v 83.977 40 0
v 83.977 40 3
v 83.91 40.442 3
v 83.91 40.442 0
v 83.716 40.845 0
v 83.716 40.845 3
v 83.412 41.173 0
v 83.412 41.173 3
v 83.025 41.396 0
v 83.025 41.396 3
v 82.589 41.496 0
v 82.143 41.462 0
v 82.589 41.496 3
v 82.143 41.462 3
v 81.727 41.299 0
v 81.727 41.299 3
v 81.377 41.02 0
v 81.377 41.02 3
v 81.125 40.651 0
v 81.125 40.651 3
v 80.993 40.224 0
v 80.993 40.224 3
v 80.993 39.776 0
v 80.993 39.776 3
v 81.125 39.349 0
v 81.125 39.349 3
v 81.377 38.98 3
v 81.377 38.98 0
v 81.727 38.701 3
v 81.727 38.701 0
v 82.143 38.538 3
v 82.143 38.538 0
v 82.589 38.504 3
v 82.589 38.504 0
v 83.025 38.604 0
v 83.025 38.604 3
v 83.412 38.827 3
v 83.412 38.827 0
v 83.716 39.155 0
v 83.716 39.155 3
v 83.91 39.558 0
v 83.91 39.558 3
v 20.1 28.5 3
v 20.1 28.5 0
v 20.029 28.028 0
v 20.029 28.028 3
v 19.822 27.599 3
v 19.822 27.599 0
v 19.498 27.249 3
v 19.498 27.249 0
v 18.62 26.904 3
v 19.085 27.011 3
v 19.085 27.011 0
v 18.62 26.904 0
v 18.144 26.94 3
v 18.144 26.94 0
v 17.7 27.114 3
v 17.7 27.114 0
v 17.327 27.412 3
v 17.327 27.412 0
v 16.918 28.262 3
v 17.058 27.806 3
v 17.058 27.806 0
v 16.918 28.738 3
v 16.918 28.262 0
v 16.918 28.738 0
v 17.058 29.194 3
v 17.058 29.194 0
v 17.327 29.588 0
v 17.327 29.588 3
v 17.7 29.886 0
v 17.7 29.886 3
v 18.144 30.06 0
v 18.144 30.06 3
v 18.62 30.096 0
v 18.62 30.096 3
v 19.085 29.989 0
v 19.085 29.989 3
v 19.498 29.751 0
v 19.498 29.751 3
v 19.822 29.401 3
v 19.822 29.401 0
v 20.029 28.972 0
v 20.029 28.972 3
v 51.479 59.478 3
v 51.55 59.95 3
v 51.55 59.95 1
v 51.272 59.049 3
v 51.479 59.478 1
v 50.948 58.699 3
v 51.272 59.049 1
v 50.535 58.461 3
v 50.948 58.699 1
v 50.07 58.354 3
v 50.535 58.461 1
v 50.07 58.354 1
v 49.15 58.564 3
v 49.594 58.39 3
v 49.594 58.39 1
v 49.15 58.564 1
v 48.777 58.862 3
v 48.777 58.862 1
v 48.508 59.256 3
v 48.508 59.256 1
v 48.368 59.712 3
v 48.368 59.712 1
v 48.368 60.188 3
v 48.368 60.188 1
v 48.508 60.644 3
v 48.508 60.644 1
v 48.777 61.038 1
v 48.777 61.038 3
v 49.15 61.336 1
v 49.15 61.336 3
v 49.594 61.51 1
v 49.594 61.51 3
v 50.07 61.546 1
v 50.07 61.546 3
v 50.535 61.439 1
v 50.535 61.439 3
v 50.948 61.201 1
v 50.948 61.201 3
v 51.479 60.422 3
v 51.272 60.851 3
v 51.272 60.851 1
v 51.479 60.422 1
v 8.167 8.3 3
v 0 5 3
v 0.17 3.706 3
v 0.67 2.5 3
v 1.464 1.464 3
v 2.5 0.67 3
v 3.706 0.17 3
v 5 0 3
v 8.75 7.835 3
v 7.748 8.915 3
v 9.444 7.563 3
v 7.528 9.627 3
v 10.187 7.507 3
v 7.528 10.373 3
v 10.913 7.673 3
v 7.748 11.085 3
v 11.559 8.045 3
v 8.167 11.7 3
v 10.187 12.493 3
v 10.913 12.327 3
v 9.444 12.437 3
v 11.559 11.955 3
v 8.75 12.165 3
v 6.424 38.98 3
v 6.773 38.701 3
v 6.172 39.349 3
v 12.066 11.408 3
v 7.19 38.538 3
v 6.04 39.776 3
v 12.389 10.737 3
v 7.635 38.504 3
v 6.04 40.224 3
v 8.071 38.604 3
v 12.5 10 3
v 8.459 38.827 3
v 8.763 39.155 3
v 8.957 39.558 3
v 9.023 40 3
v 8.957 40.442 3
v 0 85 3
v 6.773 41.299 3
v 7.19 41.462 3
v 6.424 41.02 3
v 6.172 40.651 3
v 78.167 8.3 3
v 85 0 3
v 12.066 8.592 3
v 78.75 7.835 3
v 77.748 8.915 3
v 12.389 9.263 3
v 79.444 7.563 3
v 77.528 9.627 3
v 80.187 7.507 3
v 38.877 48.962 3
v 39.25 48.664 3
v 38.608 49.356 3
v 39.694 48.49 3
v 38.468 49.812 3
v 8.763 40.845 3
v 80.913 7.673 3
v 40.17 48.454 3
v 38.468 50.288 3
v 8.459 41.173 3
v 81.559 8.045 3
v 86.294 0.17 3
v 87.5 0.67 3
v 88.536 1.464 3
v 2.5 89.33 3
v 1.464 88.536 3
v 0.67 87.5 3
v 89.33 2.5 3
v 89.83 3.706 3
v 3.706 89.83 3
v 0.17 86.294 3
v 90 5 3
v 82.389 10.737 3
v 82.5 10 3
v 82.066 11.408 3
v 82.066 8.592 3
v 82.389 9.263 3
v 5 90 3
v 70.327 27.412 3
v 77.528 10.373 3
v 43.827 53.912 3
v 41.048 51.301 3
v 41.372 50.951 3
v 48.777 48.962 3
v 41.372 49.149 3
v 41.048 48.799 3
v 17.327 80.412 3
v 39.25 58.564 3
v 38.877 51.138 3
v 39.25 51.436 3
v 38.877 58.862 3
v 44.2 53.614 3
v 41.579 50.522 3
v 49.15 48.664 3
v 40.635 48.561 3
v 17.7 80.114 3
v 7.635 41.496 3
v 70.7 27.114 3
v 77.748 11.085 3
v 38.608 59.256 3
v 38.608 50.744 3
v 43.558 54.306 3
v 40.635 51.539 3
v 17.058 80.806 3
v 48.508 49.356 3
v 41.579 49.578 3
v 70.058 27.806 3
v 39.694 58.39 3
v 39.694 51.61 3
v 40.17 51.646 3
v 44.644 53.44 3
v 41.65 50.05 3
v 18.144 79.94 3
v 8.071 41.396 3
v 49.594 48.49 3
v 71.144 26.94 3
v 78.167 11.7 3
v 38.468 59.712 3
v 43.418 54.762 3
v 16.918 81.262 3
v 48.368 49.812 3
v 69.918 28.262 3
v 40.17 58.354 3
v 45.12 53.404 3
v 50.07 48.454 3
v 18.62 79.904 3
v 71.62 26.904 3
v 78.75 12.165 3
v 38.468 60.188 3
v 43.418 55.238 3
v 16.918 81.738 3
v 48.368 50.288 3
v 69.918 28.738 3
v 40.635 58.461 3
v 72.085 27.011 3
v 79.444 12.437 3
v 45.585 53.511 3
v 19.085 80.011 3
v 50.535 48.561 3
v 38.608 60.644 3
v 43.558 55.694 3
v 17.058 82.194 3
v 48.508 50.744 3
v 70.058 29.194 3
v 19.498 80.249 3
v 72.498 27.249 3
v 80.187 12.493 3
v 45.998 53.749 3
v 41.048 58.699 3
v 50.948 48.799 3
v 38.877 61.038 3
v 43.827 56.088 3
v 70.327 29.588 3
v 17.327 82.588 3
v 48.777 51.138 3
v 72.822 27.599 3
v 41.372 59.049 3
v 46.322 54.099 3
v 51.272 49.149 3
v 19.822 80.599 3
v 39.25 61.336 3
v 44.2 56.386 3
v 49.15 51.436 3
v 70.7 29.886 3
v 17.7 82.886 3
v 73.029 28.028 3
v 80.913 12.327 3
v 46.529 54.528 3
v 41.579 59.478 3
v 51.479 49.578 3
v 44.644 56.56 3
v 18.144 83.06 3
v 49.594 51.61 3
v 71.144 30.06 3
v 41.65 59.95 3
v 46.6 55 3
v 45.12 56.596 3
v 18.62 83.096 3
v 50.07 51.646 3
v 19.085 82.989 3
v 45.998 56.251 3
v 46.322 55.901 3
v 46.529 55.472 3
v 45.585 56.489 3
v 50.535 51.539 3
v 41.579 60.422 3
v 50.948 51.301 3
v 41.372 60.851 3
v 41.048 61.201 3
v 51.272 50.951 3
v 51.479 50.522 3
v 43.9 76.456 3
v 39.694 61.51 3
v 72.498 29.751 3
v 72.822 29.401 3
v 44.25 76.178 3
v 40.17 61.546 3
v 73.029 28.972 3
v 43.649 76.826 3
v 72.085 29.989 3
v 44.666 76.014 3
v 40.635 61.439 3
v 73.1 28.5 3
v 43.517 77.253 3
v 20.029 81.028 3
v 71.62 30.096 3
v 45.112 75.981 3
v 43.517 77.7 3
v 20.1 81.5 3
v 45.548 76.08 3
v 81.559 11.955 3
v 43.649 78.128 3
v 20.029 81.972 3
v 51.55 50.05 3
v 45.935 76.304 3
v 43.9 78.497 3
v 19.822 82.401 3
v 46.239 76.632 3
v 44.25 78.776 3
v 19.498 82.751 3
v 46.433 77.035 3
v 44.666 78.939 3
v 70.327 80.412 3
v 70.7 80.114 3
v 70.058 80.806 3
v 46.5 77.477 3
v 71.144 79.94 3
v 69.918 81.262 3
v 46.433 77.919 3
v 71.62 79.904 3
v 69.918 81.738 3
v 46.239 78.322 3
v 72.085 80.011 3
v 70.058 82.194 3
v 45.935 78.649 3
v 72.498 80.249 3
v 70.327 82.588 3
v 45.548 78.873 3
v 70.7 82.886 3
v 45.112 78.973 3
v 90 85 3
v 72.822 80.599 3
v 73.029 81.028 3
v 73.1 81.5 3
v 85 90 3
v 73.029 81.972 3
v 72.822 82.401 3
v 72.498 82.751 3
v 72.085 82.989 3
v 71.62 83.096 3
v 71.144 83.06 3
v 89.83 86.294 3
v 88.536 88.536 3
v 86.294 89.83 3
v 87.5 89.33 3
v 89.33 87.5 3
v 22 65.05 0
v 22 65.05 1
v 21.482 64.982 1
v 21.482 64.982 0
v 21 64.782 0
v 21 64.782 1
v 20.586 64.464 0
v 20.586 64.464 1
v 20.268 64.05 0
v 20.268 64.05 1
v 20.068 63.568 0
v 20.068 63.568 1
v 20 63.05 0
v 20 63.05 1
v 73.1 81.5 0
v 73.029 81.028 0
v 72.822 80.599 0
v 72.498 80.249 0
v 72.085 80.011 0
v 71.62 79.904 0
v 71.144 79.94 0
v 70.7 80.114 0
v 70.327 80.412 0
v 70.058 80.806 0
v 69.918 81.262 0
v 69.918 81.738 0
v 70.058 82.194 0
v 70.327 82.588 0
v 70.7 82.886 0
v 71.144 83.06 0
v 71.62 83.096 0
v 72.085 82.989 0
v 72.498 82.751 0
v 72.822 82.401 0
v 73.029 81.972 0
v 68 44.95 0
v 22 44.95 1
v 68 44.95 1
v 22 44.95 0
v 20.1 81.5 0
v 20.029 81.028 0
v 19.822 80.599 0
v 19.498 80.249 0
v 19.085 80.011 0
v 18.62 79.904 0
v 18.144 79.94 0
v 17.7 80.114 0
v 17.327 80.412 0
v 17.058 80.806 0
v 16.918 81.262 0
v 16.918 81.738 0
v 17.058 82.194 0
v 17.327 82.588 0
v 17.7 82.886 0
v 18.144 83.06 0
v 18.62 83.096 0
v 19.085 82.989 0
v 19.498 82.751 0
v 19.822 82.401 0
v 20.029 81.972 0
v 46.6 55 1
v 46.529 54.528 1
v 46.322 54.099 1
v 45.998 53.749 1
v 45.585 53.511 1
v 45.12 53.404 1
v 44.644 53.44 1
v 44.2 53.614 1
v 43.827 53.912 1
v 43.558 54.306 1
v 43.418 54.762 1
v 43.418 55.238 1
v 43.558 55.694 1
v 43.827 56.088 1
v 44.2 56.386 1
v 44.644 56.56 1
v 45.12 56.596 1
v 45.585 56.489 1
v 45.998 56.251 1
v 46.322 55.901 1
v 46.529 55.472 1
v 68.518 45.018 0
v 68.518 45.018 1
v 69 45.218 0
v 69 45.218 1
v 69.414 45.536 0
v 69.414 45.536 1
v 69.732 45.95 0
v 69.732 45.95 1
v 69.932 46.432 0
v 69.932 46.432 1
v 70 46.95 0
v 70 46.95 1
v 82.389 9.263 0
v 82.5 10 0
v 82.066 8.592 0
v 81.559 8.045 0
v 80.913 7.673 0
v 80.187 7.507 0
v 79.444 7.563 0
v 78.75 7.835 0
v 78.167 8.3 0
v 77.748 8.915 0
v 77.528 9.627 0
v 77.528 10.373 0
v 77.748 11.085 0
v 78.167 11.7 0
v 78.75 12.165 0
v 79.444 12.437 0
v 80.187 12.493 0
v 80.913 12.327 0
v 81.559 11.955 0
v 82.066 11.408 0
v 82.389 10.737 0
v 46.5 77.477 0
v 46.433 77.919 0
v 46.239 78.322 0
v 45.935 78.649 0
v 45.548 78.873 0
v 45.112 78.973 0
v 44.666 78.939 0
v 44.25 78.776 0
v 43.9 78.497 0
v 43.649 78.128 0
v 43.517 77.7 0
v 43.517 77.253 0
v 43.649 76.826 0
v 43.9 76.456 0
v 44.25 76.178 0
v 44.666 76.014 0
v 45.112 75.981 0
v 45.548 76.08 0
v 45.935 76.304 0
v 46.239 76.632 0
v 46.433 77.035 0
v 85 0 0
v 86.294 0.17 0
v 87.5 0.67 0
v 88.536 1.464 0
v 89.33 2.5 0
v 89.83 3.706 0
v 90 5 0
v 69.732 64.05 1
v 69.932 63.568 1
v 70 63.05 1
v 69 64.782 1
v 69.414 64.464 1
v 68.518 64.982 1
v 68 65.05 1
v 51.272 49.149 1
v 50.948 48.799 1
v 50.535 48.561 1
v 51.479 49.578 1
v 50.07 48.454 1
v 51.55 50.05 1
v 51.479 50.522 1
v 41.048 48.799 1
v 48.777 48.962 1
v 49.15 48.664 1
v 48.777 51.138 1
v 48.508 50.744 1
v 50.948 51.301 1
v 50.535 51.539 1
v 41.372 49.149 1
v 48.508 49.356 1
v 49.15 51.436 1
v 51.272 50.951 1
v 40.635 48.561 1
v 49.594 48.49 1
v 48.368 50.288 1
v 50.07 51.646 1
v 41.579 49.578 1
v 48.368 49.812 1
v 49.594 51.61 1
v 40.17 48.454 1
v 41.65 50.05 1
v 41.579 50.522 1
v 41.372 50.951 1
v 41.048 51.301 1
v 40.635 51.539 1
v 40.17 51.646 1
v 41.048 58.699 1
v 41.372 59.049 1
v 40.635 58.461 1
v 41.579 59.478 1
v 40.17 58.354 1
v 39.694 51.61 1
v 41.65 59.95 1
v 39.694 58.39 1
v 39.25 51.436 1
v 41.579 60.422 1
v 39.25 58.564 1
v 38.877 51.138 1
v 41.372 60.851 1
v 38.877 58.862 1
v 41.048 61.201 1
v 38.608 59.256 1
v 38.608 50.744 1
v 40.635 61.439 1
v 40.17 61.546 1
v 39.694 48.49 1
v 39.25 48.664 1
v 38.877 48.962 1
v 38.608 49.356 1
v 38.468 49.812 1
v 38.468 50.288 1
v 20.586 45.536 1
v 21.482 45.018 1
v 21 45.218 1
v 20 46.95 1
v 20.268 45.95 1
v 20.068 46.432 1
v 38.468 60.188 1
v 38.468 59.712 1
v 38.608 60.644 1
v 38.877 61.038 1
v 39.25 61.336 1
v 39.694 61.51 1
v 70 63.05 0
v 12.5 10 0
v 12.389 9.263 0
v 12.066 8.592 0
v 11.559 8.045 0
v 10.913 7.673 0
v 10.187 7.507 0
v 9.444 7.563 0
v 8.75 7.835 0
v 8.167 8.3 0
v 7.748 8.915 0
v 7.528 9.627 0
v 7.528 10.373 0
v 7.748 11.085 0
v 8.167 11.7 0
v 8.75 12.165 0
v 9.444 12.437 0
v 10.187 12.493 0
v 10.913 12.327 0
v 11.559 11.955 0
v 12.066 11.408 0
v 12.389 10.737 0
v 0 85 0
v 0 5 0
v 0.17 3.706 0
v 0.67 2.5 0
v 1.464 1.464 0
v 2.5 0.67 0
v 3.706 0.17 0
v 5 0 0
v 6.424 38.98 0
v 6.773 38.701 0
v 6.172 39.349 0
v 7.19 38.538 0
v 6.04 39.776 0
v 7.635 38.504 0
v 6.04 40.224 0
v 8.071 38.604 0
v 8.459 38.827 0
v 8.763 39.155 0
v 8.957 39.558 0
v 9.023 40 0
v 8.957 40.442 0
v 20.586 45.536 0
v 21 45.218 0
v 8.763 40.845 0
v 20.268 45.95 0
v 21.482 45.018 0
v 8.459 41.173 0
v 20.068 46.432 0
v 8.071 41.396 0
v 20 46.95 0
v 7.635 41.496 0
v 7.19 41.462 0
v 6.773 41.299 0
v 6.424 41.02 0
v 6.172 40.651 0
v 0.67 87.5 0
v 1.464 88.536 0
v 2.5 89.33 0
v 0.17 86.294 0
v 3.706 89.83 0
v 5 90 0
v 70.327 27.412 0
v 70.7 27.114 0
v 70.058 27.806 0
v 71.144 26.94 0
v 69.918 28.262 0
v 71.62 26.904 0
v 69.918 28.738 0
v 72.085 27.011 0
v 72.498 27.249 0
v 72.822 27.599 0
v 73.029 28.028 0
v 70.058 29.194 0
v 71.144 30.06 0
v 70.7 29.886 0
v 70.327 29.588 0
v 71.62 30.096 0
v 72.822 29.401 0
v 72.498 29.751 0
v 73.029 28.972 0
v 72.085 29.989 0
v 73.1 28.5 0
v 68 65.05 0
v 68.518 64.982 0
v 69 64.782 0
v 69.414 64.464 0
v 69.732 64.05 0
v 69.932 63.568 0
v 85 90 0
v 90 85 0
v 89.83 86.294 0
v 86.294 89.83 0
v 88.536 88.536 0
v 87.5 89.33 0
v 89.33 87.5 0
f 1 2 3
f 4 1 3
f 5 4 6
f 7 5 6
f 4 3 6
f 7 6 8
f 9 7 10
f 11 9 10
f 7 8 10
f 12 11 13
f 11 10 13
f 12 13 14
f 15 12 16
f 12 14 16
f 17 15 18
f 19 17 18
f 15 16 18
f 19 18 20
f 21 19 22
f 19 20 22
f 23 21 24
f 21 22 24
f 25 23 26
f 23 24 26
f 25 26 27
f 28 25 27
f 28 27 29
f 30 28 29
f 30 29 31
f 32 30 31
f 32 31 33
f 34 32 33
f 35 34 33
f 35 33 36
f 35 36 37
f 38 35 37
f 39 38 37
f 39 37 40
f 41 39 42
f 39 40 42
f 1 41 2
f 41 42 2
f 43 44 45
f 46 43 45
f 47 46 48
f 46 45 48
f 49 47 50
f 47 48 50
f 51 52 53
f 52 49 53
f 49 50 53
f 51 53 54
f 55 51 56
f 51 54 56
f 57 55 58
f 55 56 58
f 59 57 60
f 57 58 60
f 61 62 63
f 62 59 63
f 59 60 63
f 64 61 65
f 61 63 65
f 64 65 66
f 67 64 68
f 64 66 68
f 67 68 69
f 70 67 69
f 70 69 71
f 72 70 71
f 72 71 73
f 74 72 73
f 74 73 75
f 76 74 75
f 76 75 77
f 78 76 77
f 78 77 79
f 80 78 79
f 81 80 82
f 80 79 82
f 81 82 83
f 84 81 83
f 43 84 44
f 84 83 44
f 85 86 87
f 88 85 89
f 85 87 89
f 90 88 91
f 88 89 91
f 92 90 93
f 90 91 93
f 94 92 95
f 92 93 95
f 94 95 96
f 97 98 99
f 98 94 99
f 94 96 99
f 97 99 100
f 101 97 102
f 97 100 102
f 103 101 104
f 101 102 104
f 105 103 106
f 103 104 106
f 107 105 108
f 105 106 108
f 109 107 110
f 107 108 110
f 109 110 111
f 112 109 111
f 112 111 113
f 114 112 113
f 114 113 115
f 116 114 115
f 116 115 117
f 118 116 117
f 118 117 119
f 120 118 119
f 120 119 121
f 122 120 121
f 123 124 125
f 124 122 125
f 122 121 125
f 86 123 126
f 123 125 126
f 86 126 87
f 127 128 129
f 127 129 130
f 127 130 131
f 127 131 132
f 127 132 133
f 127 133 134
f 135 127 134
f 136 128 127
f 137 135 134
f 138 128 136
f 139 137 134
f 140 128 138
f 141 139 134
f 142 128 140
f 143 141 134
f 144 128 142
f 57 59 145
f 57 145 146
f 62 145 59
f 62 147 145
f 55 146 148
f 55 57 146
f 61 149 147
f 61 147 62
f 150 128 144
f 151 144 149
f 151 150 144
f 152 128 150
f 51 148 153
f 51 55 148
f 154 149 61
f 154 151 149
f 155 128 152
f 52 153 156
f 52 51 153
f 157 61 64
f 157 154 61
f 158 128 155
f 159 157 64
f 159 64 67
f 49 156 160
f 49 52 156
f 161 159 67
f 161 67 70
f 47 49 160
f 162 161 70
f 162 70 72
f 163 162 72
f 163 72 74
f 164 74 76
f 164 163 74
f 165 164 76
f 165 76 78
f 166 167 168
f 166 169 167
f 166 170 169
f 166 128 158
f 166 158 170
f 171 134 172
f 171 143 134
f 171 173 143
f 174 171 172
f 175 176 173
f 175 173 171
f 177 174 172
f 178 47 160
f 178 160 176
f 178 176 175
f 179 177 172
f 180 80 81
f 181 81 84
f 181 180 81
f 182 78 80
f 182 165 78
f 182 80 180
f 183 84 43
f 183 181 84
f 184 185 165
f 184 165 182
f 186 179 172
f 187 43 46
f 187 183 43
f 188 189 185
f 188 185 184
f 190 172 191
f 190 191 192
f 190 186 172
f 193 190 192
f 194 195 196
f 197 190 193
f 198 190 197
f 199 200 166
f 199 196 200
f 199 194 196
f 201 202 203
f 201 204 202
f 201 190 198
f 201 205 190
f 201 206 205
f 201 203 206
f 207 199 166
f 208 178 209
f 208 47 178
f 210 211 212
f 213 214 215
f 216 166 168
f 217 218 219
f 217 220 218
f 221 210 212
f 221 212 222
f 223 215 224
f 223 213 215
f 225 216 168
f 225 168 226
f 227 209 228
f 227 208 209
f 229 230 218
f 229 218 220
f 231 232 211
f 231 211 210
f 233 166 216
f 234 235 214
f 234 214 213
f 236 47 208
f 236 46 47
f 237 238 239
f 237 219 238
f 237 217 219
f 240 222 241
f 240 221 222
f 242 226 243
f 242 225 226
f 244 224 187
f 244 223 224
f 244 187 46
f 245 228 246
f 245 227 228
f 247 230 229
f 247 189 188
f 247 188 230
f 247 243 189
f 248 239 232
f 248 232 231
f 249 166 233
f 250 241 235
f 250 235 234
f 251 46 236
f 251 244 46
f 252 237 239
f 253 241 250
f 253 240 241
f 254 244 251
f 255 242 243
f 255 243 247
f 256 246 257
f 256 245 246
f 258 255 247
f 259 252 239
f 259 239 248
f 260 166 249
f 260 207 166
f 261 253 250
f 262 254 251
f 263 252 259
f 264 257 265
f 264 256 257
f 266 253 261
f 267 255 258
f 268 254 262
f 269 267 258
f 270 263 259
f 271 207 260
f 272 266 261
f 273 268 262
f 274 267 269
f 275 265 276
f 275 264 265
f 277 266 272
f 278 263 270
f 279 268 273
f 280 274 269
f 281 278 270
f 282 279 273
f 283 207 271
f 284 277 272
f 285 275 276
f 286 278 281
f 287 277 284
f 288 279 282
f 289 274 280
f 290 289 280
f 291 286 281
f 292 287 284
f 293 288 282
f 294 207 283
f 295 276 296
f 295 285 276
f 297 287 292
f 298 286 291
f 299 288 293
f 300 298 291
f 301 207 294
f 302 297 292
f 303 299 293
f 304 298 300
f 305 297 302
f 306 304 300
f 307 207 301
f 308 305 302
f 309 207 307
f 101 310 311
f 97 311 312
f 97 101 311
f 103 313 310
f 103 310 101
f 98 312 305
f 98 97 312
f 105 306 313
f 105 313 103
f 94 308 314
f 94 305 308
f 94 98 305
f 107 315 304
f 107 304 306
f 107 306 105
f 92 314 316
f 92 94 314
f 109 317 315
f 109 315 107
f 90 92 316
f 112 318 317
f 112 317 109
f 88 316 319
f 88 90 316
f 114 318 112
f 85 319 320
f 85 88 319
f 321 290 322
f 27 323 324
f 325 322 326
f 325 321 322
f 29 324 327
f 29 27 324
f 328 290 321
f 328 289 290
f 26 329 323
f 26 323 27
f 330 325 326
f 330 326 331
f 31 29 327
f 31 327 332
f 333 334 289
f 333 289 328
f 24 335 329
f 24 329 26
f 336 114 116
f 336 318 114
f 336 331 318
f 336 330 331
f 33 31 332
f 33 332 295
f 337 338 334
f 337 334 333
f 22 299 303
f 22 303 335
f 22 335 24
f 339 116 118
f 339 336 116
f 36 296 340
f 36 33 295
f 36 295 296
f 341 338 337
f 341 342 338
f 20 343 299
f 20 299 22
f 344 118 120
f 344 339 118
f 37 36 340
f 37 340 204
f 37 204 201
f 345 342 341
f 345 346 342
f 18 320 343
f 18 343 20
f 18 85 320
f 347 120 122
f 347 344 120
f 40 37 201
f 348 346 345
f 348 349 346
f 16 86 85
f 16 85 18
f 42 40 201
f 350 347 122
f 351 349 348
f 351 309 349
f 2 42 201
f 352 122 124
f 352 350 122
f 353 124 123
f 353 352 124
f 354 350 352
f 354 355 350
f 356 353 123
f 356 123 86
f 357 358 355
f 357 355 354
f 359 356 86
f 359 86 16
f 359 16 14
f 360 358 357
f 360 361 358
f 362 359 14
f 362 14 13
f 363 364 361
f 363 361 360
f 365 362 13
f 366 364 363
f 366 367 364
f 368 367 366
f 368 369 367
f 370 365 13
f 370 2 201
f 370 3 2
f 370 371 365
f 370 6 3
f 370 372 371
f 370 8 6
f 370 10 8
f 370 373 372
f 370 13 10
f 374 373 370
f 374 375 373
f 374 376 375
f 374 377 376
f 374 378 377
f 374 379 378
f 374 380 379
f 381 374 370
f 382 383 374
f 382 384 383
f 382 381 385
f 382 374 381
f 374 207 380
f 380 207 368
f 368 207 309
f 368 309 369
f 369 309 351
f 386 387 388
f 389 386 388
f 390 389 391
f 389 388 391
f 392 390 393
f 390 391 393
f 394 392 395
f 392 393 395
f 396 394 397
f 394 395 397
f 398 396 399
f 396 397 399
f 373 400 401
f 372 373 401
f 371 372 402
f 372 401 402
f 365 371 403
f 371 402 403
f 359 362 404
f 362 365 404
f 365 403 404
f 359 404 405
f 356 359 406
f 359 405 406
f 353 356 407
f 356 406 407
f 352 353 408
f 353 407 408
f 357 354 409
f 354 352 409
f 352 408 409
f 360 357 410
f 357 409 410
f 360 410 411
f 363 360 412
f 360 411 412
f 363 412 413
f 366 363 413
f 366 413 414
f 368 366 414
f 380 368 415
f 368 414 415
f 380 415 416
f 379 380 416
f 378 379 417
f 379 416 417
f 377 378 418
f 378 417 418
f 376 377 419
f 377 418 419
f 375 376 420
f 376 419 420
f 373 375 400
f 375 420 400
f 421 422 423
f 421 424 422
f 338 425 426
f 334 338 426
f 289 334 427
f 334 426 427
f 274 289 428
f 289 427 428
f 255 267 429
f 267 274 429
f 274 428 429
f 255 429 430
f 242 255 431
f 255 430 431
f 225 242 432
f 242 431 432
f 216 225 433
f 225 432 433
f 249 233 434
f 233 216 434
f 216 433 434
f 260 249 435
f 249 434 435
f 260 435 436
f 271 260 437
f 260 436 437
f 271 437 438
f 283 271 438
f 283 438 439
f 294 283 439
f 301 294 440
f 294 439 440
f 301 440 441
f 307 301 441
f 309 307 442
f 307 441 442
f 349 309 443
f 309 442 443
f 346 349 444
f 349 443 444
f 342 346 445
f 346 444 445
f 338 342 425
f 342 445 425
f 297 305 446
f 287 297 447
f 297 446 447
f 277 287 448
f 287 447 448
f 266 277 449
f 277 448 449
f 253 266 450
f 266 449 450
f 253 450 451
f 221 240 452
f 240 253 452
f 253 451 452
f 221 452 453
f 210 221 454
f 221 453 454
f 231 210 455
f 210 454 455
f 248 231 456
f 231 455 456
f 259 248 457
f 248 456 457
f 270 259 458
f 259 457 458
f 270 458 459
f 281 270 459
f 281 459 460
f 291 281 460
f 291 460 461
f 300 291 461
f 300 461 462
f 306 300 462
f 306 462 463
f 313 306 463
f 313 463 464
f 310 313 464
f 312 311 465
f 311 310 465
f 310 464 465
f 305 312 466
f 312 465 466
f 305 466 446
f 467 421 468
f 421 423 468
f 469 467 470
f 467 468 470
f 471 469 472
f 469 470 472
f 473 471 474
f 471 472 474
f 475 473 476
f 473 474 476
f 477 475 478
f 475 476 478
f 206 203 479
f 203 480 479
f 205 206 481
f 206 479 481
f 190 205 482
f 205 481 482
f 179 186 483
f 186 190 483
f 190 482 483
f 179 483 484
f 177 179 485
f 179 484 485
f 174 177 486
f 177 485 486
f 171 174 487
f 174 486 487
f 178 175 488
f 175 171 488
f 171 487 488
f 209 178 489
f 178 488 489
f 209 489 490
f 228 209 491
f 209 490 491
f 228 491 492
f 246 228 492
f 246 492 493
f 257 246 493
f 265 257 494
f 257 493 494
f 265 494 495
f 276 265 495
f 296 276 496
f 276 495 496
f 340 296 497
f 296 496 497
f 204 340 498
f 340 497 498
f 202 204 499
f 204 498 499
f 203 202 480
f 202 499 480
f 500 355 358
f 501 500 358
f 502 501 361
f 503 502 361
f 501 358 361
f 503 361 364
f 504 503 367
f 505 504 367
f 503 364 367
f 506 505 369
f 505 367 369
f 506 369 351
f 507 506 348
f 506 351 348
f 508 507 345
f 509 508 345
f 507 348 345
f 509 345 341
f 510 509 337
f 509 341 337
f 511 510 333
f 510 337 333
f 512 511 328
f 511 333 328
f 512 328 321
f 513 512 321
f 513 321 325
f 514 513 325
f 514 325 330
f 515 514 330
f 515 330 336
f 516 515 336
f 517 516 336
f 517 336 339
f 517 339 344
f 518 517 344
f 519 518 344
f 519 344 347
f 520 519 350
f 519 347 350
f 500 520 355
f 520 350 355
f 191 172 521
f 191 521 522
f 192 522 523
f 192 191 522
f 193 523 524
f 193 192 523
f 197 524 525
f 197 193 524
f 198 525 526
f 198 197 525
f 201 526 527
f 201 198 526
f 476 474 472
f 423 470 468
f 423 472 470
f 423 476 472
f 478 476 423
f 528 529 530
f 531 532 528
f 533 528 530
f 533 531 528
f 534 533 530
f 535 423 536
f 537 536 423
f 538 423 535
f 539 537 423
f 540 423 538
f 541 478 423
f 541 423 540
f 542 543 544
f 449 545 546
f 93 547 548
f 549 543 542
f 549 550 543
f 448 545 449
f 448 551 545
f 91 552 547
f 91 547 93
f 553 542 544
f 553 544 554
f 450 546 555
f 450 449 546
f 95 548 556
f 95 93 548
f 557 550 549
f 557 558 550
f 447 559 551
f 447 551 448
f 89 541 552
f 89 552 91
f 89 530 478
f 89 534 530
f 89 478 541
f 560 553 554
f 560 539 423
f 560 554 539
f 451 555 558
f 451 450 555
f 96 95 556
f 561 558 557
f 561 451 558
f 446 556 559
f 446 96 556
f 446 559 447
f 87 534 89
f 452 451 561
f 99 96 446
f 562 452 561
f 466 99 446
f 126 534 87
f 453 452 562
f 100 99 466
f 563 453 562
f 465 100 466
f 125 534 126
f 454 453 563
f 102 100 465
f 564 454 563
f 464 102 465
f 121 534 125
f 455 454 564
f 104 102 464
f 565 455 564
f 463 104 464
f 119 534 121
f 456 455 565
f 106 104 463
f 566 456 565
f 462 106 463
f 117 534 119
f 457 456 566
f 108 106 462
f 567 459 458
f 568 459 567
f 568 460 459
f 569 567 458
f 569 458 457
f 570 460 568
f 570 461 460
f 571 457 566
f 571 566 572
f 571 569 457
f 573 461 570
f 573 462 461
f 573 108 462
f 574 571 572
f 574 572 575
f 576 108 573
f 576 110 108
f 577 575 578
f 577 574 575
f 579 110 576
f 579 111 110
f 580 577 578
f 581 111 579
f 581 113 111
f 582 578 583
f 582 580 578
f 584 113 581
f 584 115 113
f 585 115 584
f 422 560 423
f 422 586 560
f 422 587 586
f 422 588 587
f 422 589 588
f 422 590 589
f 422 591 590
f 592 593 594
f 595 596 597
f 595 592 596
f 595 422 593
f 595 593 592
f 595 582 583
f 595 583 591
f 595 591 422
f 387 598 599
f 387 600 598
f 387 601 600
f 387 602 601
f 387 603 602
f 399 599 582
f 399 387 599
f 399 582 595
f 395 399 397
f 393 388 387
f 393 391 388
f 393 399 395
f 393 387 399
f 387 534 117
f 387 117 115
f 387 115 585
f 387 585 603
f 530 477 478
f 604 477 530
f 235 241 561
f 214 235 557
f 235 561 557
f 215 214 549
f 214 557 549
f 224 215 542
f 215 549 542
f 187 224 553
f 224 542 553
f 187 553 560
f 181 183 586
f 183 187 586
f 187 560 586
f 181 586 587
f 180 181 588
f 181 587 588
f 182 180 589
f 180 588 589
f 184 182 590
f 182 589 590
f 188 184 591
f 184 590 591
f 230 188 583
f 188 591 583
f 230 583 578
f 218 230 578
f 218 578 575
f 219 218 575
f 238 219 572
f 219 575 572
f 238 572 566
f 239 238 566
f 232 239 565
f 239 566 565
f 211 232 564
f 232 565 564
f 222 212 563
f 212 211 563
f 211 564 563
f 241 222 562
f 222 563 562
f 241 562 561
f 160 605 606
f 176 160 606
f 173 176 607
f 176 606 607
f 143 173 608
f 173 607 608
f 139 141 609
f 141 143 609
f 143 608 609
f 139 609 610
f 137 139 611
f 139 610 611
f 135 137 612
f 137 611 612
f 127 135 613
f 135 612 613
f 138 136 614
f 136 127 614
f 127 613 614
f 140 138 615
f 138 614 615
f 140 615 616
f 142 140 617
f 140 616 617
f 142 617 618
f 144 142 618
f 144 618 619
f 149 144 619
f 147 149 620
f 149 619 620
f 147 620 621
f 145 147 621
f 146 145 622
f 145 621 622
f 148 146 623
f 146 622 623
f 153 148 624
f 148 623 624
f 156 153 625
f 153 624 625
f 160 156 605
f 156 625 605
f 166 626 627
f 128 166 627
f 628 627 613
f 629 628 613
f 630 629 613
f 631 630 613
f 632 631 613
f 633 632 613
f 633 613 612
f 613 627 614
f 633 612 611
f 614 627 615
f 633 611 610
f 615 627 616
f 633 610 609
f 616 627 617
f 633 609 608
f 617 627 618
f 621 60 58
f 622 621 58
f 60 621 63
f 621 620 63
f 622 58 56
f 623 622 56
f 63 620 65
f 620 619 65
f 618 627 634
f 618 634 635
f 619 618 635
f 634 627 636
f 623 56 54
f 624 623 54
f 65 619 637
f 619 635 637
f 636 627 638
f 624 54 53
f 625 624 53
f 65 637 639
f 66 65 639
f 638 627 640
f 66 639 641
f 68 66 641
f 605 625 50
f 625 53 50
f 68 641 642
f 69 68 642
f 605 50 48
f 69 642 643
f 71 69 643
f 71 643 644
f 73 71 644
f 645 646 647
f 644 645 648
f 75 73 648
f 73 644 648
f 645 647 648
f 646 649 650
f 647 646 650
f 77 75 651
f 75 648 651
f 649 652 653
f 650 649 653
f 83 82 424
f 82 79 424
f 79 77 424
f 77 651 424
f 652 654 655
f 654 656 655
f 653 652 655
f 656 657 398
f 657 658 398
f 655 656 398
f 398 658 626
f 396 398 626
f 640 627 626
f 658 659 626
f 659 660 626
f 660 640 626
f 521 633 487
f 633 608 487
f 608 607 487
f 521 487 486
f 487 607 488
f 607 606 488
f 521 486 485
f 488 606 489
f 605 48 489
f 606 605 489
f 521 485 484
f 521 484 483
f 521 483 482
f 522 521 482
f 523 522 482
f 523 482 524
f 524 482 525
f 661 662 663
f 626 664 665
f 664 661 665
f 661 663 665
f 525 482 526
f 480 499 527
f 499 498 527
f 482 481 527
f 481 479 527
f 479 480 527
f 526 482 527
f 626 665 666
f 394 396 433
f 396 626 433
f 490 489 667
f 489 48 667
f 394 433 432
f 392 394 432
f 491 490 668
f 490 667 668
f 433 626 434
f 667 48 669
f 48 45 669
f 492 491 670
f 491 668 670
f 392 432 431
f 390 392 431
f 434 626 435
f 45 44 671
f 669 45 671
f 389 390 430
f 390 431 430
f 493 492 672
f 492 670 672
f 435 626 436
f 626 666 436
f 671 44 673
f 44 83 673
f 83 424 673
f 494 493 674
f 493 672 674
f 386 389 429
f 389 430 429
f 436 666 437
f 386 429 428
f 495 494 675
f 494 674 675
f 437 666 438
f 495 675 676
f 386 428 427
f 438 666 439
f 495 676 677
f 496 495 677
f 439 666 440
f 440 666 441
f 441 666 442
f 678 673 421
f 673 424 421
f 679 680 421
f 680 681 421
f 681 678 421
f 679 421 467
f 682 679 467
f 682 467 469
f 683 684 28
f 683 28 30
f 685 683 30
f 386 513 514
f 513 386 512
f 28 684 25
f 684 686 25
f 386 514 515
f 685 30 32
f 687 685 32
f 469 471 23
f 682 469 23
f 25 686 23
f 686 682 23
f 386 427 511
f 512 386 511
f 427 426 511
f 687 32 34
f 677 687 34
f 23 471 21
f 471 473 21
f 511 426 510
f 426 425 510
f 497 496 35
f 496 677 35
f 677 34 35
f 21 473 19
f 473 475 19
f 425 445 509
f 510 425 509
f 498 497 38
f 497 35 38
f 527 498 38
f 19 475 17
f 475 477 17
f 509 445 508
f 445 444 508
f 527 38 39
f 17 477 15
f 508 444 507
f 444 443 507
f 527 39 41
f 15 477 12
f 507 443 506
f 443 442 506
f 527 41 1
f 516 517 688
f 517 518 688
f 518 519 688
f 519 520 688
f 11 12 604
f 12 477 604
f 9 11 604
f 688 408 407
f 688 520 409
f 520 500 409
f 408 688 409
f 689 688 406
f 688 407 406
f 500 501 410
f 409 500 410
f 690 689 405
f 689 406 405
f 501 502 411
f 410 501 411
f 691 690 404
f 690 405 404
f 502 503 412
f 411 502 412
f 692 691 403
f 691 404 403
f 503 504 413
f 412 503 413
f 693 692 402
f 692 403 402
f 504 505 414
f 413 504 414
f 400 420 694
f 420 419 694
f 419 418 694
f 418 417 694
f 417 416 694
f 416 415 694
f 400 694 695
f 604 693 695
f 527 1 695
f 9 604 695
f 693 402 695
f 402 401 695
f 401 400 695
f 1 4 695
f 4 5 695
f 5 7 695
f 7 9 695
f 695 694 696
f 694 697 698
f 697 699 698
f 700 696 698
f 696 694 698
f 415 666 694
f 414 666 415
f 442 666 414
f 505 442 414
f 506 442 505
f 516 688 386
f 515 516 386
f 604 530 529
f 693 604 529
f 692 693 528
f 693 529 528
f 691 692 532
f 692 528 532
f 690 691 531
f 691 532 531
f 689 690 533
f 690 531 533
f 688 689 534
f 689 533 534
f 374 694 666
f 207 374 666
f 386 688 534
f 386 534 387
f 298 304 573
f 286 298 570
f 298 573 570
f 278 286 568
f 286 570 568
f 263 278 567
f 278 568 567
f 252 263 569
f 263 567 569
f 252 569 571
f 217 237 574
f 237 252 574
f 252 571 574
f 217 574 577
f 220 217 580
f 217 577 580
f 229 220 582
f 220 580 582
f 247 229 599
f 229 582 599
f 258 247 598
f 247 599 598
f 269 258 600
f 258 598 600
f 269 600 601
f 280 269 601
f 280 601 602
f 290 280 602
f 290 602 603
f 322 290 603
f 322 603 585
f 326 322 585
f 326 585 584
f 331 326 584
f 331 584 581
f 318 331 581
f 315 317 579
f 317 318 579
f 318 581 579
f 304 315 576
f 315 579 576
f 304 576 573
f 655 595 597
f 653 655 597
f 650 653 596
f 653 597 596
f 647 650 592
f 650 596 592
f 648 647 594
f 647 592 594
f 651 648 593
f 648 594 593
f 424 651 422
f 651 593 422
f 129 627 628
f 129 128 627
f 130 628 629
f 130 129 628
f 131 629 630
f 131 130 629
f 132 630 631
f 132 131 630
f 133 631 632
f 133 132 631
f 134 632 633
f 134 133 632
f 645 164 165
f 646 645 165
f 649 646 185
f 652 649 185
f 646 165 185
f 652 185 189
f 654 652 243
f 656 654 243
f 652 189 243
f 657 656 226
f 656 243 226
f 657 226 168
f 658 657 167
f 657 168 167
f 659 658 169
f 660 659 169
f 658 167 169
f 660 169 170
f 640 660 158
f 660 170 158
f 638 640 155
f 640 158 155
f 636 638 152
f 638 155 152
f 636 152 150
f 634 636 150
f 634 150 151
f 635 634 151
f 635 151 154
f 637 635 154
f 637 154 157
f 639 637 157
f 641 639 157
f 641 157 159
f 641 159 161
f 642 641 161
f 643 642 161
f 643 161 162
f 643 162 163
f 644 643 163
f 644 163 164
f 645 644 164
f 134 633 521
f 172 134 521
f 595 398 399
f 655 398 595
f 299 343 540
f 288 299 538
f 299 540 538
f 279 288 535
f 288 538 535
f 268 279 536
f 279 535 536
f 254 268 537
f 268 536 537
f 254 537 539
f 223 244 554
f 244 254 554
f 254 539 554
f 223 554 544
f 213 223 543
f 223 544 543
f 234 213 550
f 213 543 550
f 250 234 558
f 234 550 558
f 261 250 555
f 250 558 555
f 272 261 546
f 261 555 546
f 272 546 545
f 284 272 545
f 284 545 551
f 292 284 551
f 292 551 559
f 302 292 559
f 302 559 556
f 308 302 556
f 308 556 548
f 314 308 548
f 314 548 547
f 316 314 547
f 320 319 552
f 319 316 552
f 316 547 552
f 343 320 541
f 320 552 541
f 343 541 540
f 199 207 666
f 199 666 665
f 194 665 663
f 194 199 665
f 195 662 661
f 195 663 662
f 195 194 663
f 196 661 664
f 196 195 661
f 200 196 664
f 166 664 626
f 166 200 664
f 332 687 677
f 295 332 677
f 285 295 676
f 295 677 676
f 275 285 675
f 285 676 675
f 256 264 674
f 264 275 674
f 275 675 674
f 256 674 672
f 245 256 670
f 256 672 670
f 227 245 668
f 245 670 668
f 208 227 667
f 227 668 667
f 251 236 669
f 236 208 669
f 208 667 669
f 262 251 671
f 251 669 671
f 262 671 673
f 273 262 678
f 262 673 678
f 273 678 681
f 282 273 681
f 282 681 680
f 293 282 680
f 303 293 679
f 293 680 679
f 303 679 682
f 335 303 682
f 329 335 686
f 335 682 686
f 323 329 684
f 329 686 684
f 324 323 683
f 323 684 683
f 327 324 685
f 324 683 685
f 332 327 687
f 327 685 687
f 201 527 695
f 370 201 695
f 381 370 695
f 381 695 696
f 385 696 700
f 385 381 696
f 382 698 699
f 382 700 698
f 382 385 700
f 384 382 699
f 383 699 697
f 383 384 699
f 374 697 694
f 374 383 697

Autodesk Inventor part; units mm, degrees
ref_plane "YZ Plane" through (0, 0, 0) normal (1, 0, 0) x (0, 1, 0)
ref_plane "XZ Plane" through (0, 0, 0) normal (0, 1, 0) x (-1, 0, 0)
ref_plane "XY Plane" through (0, 0, 0) normal (0, 0, 1) x (1, 0, 0)
sketch "スケッチ1" plane through (0, 0, 0) normal (0, 0, 1) x (1, 0, 0)
  line L0 (0, 0) -> (90, 0)
  line L1 (90, 0) -> (90, 90)
  line L2 (90, 90) -> (0, 90)
  line L3 (0, 90) -> (0, 0)
  line L4 (0, 10) -> (90, 10) construction
  circle A0 centre (10, 10) radius 2.5
  circle A1 centre (80, 10) radius 2.5
  circle A2 centre (18.5, 81.5) radius 1.6
  circle A3 centre (18.5, 28.5) radius 1.6
  circle A4 centre (71.5, 81.5) radius 1.6
  circle A5 centre (71.5, 28.5) radius 1.6
  line L5 (18.5, 81.5) -> (18.5, 28.5) construction
  line L6 (18.5, 28.5) -> (71.5, 28.5) construction
  line L7 (71.5, 28.5) -> (71.5, 81.5) construction
  line L8 (71.5, 81.5) -> (18.5, 81.5) construction
  line L9 (45, 90) -> (45, 0) construction
  line L10 (0, 55) -> (90, 55) construction
  line L11 (49.95, 50.05) -> (40.05, 50.05) construction
  line L12 (40.05, 50.05) -> (40.05, 59.95) construction
  line L13 (40.05, 59.95) -> (49.95, 59.95) construction
  line L14 (49.95, 59.95) -> (49.95, 50.05) construction
  line L15 (49.95, 50.05) -> (40.05, 59.95) construction
  line L16 (40.05, 50.05) -> (49.95, 59.95) construction
  circle A6 centre (49.95, 59.95) radius 1.6
  circle A7 centre (40.05, 59.95) radius 1.6
  circle A8 centre (49.95, 50.05) radius 1.6
  circle A9 centre (40.05, 50.05) radius 1.6
  circle A10 centre (45, 55) radius 1.6
  dimension "d0" = 5
  dimension "d1" = 10
  dimension "d2" = 10
  dimension "d3" = 10
  dimension "d4" = 90
  dimension "d5" = 90
  dimension "d12" = 3.2
  dimension "d21" = 53
  dimension "d23" = 53
  dimension "d33" = 55
  dimension "d34" = 3.2
  dimension "d35" = 9.9
  dimension "d36" = 9.9
extrude "押し出し1" add sketch "スケッチ1" along normal blind 3
sketch "スケッチ2" plane through (0, 0, 3) normal (0, 0, 1) x (1, 0, 0)
  line L0 (90, 90) -> (0, 90) construction
  line L1 (45, 90) -> (45, 0) construction
  line L2 (45, 77.4767) -> (82.4767, 40) construction
  line L3 (82.4767, 40) -> (45, 2.5233) construction
  line L4 (45, 2.5233) -> (7.5233, 40) construction
  line L5 (7.5233, 40) -> (45, 77.4767) construction
  line L6 (45, 77.4767) -> (45, 2.5233) construction
  line L7 (82.4767, 40) -> (7.5233, 40) construction
  line L8 (0, 0) -> (90, 0) construction
  circle A0 centre (82.4767, 40) radius 1.5
  circle A1 centre (45, 77.4767) radius 1.5
  circle A2 centre (45, 2.5233) radius 1.5 construction
  circle A3 centre (7.5233, 40) radius 1.5
  point P0 (45, 40)
  dimension "d27" = 53
  dimension "d28" = 90
  dimension "d29" = 40
  dimension "d30" = 3
extrude "押し出し2" cut sketch "スケッチ2" against normal up to next
fillet "フィレット2" radius 5 4 edges at (90, 90, 1.5) (0, 90, 1.5) (90, 0, 1.5) (0, 0, 1.5)
sketch "スケッチ3" plane through (0, 0, 0) normal (0, 0, -1) x (-1, 0, 0)
  line L0 (-70, 65.05) -> (-20, 65.05)
  line L1 (-20, 65.05) -> (-20, 44.95)
  line L2 (-20, 44.95) -> (-70, 44.95)
  line L3 (-70, 44.95) -> (-70, 65.05)
  circle A0 centre (-45, 55) radius 1.6 projected
  line L4 (-70, 65.05) -> (-20, 44.95) construction
  line L5 (-20, 65.05) -> (-70, 44.95) construction
  point P0 (0, 0)
  dimension "d38" = 20.1
  dimension "d39" = 50
extrude "押し出し3" cut sketch "スケッチ3" against normal blind 1
fillet "フィレット3" radius 2 4 edges at (70, 65.05, 0.5) (20, 65.05, 0.5) (20, 44.95, 0.5) (70, 44.95, 0.5)
properties part number "LRFマウント"
